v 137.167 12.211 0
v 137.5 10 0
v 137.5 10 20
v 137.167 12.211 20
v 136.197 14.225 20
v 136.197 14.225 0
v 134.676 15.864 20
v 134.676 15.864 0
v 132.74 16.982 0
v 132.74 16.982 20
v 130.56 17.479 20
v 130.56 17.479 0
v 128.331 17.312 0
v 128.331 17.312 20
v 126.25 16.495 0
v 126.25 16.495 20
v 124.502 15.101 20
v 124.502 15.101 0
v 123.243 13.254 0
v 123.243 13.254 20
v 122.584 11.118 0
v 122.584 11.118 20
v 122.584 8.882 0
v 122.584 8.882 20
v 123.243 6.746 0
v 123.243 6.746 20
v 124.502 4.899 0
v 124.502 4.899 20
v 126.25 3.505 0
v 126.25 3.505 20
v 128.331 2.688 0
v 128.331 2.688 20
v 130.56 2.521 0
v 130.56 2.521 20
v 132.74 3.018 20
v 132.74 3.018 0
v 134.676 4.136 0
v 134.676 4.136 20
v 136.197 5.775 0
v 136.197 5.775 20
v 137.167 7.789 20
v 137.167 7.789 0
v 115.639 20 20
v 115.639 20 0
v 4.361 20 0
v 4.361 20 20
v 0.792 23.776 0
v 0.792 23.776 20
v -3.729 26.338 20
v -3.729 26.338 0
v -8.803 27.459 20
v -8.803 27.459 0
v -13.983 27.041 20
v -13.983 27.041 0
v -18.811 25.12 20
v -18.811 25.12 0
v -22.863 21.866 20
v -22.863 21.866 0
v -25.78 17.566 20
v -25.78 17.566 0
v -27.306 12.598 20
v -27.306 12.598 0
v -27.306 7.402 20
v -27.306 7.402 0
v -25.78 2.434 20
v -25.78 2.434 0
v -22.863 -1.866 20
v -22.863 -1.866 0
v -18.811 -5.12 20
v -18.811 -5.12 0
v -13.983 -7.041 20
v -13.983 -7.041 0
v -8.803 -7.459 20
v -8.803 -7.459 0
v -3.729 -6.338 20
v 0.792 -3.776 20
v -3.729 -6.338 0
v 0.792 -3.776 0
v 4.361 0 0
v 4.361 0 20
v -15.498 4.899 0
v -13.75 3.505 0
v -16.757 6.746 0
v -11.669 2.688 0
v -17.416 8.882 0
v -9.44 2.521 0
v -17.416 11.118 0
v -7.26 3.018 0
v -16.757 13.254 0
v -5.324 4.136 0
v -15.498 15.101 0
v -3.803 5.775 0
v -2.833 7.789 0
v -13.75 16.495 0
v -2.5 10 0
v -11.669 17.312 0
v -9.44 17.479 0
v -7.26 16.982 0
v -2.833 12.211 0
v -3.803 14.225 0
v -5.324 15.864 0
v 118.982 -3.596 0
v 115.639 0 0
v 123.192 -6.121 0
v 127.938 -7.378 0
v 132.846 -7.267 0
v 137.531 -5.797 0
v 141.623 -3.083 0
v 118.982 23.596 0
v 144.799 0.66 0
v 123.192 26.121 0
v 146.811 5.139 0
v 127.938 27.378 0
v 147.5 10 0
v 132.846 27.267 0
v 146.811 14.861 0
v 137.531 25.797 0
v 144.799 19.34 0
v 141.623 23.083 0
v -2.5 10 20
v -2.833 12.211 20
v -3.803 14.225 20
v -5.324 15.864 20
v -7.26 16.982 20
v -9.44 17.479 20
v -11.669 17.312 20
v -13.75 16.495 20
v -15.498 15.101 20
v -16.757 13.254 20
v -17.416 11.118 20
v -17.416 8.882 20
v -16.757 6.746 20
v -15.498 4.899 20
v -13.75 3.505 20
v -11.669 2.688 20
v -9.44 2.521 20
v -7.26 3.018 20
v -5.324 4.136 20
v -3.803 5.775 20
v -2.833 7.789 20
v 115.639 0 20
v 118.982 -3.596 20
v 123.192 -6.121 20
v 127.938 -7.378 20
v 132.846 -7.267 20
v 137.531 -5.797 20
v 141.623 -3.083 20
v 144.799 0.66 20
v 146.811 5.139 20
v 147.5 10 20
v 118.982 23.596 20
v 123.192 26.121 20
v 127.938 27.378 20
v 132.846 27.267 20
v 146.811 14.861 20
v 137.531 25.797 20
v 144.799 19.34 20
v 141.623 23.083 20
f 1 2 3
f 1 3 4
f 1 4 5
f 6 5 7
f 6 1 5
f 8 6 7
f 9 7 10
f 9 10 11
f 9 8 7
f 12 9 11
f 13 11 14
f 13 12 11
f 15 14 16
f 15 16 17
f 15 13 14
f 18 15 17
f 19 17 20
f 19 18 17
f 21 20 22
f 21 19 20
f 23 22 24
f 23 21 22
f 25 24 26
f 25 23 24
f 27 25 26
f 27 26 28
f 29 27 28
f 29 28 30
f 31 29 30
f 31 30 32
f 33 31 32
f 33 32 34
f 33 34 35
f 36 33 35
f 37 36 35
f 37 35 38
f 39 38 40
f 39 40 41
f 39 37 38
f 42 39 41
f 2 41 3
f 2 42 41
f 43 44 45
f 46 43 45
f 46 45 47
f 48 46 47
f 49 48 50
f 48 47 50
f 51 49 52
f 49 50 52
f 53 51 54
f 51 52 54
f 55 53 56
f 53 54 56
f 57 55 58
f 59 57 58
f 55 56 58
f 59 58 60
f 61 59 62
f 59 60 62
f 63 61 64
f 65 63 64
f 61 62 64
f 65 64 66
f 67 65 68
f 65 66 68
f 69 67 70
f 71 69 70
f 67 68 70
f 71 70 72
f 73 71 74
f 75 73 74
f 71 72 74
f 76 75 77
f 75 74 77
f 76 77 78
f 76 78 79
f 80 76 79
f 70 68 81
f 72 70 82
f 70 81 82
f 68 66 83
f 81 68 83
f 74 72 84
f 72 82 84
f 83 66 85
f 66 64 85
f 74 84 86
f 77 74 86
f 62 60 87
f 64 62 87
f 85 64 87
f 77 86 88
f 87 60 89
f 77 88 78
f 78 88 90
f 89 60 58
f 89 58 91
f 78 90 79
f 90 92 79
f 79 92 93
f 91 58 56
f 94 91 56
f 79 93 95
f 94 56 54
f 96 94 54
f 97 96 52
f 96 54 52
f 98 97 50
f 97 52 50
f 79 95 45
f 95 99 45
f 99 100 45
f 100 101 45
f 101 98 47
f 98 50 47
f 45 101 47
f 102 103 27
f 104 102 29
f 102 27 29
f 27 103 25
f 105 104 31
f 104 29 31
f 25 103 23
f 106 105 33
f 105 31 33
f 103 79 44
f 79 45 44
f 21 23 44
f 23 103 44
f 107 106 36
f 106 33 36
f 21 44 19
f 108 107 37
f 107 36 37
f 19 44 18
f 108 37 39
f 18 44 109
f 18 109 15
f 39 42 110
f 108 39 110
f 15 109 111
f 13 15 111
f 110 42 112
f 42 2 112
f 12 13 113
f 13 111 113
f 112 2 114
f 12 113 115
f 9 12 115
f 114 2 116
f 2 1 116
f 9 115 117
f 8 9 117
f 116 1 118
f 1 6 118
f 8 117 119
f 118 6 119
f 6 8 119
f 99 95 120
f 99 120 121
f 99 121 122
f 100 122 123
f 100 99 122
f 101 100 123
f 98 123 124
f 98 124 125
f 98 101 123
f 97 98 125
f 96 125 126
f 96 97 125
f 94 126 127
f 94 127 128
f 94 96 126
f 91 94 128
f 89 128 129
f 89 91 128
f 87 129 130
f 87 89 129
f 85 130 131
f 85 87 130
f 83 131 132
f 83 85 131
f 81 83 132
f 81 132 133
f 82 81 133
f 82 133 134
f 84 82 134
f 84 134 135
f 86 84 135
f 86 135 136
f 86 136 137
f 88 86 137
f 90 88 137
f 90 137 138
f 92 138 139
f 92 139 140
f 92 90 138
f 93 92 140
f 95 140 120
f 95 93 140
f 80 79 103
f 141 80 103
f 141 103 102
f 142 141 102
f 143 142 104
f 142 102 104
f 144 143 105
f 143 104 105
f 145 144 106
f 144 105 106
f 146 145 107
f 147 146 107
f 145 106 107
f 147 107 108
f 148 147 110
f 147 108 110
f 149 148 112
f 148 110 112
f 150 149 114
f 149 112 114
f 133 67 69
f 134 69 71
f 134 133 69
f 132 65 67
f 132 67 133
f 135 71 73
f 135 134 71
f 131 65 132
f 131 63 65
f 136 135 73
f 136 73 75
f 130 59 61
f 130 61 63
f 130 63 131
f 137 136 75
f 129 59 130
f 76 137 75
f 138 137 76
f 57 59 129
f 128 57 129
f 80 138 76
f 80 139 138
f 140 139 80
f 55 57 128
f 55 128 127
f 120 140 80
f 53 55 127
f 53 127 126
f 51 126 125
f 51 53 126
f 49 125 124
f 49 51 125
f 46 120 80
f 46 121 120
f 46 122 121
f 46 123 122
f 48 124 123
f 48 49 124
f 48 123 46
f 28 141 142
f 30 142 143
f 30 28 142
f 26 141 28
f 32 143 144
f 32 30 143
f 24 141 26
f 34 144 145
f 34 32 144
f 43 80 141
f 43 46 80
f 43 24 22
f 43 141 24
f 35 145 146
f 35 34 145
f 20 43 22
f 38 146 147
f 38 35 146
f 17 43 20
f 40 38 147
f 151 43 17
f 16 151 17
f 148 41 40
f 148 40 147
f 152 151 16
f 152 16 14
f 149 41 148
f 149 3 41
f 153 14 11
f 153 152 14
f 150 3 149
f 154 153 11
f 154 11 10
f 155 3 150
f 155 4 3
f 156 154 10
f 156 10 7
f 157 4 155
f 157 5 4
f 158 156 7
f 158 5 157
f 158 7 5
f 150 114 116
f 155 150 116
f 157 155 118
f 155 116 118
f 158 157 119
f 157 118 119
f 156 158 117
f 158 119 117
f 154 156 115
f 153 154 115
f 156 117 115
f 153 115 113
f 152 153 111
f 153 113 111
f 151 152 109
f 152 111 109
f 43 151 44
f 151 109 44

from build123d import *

# Parameters (mm, degrees)
SKETCH1_R           = 7.5
BOSS_EXTRUDE2_DEPTH = 20


with BuildPart() as part:
    # Sketch1 → Boss-Extrude2 (new body)
    # profile 1 of 5: a face of its own
    with BuildSketch(Plane.XY):
        with BuildLine():
            ThreePointArc((7.5, 10), (6.696925103, 4.759514134), (4.361406616, 0))
            Line((4.361406616, 0), (115.638593384, 0))
            ThreePointArc((115.638593384, 0), (112.5, 10), (115.638593384, 20))
            Line((115.638593384, 20), (4.361406616, 20))
            ThreePointArc((4.361406616, 20), (6.696925103, 15.240485866), (7.5, 10))
        make_face()
    # profile 2 of 5: a face of its own
    with BuildSketch(Plane.XY):
        with BuildLine():
            Line((0, 20), (0, 0))
            Line((0, 0), (4.361406616, 0))
            ThreePointArc((4.361406616, 0), (6.696925103, 4.759514134), (7.5, 10))
            ThreePointArc((7.5, 10), (6.696925103, 15.240485866), (4.361406616, 20))
            Line((4.361406616, 20), (0, 20))
        make_face()
    # profile 3 of 5: a face of its own
    with BuildSketch(Plane.XY):
        with BuildLine():
            ThreePointArc((115.638593384, 20), (112.5, 10), (115.638593384, 0))
            Line((115.638593384, 0), (120, 0))
            Line((120, 0), (120, 20))
            Line((120, 20), (115.638593384, 20))
        make_face()
    # profile 4 of 5: a face of its own
    with BuildSketch(Plane.XY):
        with BuildLine():
            Line((120, 0), (115.638593384, 0))
            ThreePointArc((115.638593384, 0), (135.240485866, -6.696925103), (147.5, 10))
            ThreePointArc((147.5, 10), (135.240485866, 26.696925103), (115.638593384, 20))
            Line((115.638593384, 20), (120, 20))
            Line((120, 20), (120, 0))
        make_face()
        with Locations((130, 10)):
            Circle(SKETCH1_R, mode=Mode.SUBTRACT)
    # profile 5 of 5: a face of its own
    with BuildSketch(Plane.XY):
        with BuildLine():
            Line((4.361406616, 0), (0, 0))
            Line((0, 0), (0, 20))
            Line((0, 20), (4.361406616, 20))
            ThreePointArc((4.361406616, 20), (-27.5, 10), (4.361406616, 0))
        make_face()
        with Locations((-10, 10)):
            Circle(SKETCH1_R, mode=Mode.SUBTRACT)
    extrude(amount=BOSS_EXTRUDE2_DEPTH)


solid = part.part
